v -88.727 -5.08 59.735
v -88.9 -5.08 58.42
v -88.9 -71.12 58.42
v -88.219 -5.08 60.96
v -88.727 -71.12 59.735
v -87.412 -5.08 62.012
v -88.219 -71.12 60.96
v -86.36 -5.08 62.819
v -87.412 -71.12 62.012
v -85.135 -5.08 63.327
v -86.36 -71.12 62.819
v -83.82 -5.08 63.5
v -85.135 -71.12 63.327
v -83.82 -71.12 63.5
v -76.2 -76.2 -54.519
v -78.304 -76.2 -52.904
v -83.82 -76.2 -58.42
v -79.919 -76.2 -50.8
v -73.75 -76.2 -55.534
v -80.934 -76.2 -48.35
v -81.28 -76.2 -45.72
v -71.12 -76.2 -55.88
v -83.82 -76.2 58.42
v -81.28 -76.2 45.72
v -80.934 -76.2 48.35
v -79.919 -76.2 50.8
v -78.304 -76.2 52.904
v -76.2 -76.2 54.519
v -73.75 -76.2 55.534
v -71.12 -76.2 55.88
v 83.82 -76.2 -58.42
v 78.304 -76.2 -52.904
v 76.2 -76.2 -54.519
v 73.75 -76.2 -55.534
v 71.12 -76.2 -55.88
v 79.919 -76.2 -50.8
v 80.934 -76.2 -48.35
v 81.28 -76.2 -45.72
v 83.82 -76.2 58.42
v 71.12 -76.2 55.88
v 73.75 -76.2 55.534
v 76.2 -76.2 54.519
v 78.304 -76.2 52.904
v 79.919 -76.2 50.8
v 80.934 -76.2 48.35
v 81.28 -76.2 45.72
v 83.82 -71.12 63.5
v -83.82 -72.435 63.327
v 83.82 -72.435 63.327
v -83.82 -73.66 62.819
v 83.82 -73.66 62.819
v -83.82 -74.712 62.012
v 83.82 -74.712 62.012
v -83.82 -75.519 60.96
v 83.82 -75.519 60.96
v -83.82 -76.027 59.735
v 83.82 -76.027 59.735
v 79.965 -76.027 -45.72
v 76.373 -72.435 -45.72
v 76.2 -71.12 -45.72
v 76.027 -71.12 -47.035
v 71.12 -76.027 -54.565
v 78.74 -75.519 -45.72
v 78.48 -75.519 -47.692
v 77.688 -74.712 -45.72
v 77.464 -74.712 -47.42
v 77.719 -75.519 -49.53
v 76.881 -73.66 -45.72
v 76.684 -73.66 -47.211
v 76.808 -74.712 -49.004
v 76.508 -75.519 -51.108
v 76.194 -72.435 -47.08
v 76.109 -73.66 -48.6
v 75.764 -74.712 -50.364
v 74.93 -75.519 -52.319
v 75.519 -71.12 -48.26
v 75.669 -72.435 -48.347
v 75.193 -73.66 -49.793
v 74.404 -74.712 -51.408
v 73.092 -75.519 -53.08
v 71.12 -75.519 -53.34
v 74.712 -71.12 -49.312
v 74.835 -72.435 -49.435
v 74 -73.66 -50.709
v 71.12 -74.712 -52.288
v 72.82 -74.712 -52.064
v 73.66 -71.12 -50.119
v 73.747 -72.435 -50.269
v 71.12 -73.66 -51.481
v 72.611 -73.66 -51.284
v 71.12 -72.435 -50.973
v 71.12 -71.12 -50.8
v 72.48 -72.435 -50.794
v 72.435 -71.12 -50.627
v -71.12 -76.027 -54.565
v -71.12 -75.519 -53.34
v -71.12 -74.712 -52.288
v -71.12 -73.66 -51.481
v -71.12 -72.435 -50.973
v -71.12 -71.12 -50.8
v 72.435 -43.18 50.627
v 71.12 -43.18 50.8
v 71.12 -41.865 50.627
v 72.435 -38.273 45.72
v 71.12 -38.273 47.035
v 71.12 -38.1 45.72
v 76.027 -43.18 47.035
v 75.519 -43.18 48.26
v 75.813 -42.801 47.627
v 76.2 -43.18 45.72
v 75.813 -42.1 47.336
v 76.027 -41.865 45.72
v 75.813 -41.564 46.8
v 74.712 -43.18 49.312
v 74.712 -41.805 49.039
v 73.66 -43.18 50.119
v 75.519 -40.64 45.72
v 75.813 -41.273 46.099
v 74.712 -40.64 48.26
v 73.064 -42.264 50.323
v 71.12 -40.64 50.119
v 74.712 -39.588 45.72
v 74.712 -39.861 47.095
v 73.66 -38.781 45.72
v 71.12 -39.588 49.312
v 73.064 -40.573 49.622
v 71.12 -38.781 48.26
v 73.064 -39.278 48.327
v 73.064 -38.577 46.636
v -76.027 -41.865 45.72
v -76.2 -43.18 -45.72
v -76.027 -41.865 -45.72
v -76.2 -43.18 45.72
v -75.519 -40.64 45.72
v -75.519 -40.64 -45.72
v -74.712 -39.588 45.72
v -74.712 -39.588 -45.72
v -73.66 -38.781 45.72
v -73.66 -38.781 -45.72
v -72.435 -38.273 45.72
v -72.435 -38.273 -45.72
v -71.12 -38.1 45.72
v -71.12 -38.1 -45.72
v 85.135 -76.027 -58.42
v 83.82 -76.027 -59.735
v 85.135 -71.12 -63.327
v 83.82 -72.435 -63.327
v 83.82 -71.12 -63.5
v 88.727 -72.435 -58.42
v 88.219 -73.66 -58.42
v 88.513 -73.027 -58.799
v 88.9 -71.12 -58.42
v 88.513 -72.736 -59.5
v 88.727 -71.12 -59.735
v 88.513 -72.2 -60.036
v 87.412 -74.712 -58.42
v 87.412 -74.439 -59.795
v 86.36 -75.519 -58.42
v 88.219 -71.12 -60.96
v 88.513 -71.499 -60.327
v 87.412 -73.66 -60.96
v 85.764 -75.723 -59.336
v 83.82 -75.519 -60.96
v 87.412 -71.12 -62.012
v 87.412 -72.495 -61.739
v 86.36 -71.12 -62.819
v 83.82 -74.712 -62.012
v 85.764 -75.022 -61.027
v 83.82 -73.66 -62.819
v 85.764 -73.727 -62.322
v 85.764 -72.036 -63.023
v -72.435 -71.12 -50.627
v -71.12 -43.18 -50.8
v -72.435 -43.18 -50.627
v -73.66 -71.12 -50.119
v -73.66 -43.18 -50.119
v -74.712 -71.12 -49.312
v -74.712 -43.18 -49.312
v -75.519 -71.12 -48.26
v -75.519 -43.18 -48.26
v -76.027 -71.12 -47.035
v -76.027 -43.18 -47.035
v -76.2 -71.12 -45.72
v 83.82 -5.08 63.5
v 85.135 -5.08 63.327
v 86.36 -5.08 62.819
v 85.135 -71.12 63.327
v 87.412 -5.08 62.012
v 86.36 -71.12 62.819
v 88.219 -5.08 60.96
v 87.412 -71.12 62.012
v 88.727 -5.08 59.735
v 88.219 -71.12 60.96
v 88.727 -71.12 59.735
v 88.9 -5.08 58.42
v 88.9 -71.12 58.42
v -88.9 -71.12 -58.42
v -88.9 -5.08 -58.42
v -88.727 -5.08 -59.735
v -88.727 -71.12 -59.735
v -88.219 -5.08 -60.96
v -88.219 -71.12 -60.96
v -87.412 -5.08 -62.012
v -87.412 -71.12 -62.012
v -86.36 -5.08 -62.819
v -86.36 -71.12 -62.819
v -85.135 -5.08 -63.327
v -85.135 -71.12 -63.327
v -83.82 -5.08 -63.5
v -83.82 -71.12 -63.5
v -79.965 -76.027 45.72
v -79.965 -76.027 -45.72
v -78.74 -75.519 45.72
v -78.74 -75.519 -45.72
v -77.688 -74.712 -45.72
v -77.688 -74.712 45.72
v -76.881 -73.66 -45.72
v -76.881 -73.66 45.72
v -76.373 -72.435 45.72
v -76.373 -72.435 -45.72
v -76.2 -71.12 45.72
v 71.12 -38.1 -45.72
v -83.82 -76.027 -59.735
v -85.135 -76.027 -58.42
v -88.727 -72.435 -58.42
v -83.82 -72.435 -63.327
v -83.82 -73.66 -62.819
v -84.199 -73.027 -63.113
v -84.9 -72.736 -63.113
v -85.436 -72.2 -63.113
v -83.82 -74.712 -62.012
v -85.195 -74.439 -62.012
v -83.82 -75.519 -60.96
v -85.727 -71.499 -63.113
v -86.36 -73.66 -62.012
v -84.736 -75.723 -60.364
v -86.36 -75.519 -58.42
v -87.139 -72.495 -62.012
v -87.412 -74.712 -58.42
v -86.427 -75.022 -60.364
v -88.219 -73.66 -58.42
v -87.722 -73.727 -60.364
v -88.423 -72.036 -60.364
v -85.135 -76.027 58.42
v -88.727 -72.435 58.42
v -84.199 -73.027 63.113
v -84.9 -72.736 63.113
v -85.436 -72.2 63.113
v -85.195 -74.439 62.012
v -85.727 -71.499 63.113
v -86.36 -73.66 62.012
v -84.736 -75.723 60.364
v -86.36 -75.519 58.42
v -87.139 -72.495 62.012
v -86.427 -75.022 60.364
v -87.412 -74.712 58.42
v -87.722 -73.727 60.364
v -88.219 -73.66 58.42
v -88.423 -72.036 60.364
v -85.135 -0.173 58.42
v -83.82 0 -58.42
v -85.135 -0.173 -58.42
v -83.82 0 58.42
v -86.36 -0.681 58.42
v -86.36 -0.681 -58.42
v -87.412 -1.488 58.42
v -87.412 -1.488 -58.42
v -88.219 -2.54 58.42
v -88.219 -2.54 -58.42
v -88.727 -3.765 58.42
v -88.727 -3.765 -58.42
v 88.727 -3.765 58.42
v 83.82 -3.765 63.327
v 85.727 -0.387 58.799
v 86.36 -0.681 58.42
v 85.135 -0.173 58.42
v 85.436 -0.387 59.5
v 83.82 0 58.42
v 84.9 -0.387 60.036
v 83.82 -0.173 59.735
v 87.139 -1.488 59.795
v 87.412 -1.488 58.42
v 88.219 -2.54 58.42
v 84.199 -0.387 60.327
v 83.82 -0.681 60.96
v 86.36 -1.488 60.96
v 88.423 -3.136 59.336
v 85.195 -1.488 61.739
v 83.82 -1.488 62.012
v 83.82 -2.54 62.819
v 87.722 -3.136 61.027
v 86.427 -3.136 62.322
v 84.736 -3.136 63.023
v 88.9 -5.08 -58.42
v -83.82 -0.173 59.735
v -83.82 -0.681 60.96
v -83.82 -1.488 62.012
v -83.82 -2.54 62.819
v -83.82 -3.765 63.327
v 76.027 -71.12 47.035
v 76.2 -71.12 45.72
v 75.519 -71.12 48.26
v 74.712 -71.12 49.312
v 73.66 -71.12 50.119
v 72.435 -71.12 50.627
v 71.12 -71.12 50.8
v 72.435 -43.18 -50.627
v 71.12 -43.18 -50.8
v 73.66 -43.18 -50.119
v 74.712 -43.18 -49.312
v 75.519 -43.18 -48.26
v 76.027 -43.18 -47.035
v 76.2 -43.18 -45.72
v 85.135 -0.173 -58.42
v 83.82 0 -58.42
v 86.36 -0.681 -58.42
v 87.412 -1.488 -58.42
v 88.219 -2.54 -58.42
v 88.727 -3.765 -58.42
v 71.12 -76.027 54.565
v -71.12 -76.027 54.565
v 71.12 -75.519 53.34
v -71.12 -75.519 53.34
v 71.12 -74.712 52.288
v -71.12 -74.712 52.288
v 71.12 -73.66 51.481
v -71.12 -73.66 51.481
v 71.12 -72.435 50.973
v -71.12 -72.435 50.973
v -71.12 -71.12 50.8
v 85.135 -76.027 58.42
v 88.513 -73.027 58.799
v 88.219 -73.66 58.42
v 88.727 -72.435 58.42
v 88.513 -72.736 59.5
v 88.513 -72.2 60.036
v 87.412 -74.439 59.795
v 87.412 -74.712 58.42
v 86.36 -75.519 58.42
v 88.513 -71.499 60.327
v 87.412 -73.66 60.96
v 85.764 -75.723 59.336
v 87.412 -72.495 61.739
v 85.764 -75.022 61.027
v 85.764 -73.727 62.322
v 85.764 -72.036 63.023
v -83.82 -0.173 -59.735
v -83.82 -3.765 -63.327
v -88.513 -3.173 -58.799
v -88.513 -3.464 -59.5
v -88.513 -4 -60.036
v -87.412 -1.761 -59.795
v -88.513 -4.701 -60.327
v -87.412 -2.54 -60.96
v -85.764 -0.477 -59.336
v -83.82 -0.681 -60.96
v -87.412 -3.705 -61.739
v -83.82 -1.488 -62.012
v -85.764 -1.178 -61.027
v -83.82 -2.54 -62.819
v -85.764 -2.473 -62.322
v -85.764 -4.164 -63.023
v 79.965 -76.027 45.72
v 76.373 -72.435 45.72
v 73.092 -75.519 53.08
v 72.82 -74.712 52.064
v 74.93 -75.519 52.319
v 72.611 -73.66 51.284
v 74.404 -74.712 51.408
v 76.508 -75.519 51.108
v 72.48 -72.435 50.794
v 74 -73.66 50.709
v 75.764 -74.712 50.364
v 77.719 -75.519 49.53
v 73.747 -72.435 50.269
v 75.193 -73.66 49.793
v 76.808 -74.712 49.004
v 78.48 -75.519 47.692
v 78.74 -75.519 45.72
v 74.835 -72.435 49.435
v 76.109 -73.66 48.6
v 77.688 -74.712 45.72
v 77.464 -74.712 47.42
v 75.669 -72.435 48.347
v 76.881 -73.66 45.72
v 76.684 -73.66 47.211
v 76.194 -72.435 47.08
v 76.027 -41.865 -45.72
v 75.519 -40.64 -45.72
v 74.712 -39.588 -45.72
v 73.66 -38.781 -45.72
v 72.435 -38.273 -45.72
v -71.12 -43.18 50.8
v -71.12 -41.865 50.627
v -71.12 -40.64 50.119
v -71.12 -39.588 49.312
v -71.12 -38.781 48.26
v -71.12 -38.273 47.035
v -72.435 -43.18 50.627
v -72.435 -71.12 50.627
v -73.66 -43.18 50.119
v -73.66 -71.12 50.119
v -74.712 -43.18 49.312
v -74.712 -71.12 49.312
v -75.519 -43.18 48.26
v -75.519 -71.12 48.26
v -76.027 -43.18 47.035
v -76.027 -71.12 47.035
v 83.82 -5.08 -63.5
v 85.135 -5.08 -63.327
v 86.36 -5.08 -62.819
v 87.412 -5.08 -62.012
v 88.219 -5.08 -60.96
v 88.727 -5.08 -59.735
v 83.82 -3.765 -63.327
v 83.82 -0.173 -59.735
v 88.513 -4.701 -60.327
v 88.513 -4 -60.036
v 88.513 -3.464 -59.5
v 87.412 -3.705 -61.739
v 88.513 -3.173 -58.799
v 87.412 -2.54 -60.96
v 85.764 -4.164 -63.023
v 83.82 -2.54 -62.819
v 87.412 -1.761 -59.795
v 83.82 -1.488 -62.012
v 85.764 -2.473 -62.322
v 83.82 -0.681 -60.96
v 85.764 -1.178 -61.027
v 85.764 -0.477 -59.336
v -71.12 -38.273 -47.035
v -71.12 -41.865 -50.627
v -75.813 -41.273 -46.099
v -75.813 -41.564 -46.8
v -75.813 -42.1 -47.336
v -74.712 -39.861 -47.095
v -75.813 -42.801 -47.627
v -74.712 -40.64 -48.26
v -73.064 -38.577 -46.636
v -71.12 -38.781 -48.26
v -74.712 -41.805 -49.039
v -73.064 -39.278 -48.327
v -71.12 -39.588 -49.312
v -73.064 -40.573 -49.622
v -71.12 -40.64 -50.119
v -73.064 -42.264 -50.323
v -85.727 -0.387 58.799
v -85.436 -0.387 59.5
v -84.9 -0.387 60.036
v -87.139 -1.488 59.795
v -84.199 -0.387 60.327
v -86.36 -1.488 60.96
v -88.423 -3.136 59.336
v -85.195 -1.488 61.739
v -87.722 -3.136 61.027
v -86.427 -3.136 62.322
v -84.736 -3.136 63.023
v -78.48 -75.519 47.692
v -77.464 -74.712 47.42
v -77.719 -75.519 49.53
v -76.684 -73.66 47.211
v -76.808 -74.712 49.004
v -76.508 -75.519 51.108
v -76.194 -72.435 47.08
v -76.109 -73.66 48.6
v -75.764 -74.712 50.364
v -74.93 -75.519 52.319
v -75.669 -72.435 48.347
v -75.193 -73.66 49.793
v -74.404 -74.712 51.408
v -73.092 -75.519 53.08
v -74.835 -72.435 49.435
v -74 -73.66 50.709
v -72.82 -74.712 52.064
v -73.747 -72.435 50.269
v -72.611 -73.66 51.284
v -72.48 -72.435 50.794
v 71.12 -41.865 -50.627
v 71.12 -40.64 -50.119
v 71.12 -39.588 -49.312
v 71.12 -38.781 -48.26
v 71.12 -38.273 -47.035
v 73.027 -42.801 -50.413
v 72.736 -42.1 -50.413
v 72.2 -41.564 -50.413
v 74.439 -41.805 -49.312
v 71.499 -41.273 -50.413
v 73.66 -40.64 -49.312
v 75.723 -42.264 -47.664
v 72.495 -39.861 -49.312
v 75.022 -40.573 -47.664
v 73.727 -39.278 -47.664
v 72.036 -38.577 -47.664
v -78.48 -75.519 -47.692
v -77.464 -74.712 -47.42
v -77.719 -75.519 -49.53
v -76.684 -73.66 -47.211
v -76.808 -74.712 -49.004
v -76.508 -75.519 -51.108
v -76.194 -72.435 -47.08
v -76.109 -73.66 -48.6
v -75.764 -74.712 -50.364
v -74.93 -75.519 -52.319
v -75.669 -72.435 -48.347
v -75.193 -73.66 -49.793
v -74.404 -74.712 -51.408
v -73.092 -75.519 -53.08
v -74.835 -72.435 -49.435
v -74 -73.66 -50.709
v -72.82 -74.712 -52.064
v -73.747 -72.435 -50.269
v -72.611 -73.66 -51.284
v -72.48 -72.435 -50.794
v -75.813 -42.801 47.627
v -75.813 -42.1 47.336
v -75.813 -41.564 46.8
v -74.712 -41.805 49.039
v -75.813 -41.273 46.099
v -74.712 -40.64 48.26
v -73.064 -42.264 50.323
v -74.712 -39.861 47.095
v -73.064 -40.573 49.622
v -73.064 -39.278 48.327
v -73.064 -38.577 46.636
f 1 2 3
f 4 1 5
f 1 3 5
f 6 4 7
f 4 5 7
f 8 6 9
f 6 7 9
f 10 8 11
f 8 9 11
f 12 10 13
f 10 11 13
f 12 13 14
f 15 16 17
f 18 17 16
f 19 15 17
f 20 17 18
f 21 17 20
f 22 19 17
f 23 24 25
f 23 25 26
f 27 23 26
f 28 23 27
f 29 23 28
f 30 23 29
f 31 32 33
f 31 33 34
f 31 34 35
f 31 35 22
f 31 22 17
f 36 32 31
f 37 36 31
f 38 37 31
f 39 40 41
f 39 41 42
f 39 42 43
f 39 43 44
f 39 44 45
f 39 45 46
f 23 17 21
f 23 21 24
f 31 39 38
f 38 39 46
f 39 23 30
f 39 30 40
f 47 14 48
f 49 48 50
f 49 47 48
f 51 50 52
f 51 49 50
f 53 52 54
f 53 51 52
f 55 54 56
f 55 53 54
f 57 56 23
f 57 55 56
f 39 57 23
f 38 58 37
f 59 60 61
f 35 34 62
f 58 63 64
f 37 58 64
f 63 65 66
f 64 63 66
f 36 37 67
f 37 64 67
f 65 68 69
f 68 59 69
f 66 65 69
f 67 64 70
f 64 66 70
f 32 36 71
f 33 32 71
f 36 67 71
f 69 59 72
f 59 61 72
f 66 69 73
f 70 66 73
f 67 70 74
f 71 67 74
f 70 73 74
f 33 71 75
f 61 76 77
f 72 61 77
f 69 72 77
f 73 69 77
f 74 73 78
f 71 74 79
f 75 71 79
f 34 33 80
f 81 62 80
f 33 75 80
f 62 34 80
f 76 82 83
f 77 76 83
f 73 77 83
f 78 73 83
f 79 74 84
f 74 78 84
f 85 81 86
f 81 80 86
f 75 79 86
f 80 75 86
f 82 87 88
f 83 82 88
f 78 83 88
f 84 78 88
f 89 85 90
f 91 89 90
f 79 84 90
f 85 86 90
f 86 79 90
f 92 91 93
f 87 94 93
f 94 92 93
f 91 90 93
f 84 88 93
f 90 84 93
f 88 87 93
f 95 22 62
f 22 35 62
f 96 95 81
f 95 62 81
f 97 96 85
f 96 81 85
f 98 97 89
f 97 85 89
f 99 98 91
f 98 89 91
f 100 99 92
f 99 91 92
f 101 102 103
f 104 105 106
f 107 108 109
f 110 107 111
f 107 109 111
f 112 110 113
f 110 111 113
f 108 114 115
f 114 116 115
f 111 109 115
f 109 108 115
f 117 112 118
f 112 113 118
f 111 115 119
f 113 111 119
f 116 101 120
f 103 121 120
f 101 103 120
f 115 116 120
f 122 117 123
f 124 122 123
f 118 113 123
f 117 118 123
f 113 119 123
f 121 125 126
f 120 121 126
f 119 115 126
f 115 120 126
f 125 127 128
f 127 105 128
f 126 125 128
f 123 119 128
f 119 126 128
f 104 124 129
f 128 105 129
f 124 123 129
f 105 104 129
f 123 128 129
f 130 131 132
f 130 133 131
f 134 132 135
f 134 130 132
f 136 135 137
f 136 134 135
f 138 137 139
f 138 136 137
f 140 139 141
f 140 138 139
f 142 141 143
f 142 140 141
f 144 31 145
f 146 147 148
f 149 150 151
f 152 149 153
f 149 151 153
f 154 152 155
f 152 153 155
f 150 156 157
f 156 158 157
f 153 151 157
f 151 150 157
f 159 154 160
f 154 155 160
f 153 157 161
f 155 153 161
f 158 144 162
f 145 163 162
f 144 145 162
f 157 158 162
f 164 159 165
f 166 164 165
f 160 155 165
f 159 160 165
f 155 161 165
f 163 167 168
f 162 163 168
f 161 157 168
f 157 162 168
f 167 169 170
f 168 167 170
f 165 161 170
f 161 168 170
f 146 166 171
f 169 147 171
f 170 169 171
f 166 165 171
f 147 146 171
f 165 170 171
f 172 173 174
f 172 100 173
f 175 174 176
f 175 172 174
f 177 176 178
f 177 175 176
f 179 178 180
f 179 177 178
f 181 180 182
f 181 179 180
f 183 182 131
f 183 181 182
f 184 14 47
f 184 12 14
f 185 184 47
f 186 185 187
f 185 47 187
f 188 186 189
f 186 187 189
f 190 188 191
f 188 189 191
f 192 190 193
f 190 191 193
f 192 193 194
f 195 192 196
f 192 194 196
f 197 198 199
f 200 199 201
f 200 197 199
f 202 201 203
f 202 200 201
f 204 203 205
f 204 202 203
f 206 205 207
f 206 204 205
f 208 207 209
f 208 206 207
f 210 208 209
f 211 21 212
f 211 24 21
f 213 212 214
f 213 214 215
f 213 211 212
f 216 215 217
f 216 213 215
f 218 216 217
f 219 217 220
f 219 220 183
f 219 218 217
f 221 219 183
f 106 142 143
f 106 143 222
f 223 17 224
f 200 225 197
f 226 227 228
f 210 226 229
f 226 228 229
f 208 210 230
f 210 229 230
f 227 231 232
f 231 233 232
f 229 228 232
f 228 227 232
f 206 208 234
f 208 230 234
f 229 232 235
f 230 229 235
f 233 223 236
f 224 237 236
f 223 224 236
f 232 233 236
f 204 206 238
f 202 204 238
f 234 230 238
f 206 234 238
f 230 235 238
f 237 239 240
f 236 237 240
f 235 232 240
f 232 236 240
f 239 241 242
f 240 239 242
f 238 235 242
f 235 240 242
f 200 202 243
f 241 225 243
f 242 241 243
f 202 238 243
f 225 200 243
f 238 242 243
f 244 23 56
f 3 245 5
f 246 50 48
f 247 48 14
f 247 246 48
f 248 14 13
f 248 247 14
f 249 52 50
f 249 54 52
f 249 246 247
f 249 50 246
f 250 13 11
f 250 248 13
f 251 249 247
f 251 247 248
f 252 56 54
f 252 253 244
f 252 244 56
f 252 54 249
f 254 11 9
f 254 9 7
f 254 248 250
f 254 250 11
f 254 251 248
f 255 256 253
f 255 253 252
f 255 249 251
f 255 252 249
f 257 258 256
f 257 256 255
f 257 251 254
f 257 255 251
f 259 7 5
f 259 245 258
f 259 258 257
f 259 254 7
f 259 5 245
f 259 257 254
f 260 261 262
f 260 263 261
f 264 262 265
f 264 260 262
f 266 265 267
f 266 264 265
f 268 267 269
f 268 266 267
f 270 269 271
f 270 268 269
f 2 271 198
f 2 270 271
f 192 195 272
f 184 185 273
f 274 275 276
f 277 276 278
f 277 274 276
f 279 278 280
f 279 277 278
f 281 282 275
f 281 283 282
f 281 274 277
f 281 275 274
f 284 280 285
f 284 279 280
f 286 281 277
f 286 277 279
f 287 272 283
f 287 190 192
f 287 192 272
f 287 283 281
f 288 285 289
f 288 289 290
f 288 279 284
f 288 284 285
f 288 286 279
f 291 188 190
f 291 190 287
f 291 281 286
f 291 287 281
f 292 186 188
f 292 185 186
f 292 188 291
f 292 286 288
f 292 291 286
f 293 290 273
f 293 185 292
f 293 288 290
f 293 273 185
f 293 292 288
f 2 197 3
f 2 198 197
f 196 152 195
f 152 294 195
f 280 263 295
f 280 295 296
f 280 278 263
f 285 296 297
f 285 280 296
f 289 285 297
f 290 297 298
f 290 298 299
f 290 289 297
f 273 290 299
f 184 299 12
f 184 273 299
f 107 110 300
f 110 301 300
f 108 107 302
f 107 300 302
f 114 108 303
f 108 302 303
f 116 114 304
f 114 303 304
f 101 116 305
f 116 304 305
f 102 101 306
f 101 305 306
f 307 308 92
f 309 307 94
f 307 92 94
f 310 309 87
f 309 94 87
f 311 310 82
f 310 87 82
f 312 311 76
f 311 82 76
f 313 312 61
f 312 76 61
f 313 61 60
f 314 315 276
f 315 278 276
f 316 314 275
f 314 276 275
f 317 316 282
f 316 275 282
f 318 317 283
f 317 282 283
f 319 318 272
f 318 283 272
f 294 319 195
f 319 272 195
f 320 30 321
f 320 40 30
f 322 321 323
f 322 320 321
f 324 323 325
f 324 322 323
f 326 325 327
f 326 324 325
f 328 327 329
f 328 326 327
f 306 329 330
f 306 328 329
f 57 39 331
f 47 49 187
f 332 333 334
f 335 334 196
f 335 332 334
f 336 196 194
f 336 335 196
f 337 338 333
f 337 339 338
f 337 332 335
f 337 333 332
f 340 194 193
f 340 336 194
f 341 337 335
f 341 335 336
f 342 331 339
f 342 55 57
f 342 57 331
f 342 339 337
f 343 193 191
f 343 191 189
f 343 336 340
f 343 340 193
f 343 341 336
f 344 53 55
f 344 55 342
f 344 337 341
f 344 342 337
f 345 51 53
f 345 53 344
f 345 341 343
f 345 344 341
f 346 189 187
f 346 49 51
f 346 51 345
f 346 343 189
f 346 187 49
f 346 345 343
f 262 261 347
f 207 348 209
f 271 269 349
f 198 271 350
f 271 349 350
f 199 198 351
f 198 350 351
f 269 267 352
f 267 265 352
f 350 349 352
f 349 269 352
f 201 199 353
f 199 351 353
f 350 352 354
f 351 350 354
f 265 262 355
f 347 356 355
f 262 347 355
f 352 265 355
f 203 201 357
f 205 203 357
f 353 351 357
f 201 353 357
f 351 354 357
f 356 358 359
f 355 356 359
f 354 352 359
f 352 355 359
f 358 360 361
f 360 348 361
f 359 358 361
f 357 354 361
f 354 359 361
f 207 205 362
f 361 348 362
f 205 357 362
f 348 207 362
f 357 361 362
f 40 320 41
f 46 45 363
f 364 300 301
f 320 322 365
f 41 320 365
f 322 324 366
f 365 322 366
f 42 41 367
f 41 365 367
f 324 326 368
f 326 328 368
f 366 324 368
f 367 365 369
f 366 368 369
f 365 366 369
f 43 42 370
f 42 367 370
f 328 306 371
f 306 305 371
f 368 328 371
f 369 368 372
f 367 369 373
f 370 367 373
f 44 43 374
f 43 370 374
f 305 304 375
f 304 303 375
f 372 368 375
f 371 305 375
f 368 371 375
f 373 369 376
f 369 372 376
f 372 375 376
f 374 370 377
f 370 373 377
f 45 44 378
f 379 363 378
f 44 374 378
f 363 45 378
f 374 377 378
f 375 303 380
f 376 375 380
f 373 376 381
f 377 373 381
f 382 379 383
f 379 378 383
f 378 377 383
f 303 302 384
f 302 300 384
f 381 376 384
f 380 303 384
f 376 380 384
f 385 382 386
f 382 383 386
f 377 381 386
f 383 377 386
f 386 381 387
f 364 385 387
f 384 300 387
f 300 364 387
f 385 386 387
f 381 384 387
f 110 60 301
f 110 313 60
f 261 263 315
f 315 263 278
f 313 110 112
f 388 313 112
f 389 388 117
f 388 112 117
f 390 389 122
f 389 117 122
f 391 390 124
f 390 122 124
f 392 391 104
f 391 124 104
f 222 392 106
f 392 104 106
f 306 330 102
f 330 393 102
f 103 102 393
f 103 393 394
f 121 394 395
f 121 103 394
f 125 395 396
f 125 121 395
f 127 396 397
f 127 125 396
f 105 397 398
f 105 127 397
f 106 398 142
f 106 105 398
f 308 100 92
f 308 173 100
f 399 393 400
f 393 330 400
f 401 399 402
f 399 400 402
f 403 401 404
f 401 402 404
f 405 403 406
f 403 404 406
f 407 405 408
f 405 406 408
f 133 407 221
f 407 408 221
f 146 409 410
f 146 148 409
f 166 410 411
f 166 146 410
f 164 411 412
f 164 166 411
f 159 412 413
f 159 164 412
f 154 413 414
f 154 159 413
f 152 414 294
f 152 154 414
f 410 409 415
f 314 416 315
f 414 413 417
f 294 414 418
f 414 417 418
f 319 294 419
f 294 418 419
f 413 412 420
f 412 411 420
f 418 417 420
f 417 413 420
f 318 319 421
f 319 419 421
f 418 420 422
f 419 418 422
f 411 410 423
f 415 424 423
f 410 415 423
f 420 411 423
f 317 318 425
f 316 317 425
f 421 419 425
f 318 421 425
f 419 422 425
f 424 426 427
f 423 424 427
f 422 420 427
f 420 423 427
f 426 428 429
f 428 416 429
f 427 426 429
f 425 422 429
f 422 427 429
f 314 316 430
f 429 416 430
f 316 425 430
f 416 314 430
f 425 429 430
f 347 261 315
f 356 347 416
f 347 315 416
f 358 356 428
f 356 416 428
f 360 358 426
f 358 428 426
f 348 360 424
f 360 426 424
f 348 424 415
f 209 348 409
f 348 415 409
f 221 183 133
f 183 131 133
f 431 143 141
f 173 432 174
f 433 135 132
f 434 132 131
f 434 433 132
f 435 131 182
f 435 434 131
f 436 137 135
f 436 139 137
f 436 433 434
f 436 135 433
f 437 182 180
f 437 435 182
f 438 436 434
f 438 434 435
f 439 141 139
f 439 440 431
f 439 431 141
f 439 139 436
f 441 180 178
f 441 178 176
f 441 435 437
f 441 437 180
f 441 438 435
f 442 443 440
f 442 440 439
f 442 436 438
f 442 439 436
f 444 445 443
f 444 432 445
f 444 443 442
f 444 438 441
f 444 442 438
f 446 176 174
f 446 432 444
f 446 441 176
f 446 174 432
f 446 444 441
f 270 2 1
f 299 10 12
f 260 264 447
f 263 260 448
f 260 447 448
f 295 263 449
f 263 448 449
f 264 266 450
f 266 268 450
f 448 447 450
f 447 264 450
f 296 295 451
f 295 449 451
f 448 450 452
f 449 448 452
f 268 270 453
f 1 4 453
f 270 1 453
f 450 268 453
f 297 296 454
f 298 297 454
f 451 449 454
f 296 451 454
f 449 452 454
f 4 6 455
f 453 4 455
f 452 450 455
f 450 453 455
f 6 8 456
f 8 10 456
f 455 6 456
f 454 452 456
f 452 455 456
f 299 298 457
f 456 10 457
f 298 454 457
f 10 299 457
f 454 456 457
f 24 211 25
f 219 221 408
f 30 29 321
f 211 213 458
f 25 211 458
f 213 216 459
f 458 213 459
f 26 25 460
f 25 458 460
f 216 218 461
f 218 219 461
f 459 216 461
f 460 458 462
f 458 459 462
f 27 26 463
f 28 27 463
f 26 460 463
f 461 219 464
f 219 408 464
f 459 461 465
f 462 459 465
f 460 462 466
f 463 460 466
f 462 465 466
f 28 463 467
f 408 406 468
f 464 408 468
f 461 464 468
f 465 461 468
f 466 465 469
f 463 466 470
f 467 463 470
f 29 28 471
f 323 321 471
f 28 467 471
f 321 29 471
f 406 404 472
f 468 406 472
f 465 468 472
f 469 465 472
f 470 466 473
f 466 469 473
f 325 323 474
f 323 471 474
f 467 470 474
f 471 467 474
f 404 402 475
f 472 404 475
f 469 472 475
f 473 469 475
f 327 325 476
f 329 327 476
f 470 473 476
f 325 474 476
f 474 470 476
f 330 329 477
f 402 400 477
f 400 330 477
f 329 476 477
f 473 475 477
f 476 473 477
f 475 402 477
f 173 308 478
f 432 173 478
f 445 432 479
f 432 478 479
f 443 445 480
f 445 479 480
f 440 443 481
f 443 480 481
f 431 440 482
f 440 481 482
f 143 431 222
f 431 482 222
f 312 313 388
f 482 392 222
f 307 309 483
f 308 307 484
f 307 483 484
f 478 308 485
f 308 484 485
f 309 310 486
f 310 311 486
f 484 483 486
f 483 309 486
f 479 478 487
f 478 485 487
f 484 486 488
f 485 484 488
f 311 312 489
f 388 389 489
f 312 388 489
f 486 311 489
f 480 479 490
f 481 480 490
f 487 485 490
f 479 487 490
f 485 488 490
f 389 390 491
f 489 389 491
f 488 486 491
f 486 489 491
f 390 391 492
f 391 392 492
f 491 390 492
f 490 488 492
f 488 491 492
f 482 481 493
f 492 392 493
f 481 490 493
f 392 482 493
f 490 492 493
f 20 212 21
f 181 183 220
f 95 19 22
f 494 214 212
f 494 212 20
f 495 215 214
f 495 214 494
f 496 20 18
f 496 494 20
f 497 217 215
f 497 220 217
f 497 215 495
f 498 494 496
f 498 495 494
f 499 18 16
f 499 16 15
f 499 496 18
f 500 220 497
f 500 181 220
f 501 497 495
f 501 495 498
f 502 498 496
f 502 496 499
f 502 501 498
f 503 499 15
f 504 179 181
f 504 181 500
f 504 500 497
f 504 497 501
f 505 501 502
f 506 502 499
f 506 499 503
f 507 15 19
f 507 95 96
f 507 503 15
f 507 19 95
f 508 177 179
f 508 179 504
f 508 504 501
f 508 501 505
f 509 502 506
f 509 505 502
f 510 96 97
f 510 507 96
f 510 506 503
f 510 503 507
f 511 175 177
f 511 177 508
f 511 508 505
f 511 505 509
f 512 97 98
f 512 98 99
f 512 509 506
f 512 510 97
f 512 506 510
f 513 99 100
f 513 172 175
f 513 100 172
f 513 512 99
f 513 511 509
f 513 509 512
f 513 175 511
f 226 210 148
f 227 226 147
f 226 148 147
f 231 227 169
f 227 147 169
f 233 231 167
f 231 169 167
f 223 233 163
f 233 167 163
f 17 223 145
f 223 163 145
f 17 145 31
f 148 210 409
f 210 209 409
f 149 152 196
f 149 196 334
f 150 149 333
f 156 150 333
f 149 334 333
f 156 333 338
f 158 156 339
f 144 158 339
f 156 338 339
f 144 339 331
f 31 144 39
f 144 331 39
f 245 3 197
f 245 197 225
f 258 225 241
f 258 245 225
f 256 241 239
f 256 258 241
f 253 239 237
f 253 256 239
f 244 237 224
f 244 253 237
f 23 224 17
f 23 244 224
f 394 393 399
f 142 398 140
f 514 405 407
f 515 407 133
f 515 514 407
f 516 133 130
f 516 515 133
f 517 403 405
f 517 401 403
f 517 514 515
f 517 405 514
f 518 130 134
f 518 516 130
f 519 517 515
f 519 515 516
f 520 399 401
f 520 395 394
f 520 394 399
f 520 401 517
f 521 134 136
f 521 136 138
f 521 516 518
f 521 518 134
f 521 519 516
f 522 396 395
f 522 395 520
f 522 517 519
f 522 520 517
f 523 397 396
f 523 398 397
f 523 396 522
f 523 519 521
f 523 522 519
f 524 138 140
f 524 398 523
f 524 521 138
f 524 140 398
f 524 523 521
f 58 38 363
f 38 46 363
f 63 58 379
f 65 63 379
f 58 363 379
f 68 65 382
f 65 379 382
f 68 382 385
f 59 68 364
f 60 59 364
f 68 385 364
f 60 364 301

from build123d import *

# Parameters (mm, degrees)
F0_W     = 177.8
F0_H     = 127
F0_W_2   = 152.4
F0_H_2   = 101.6
F1_DEPTH = 76.2
F2_DEPTH = 38.1
F3_R     = 5.08


with BuildPart() as f1:
    # F0 (on Front) → F1 (new body)
    with BuildSketch(Plane.XZ):
        Rectangle(F0_W, F0_H)
        Rectangle(F0_W_2, F0_H_2, mode=Mode.SUBTRACT)
    extrude(amount=F1_DEPTH)

    # F0 (on Front) → F2 (join)
    with BuildSketch(Plane.XZ):
        Rectangle(F0_W_2, F0_H_2)
    extrude(amount=F2_DEPTH)

    # F3
    f3_edges = [f1.edges().sort_by_distance(p)[0] for p in [
        (-88.9, -76.2, 0),
        (0, -76.2, 63.5),
        (0, -76.2, -63.5),
        (88.9, -76.2, 0),
        (-76.2, -76.2, 0),
        (0, -76.2, 50.8),
        (76.2, -76.2, 0),
        (0, -76.2, -50.8),
        (0, -38.1, 50.8),
        (76.2, -57.15, 50.8),
        (76.2, -38.1, 0),
        (76.2, -57.15, -50.8),
        (0, -38.1, -50.8),
        (-76.2, -57.15, 50.8),
        (-76.2, -38.1, 0),
        (-76.2, -57.15, -50.8),
        (-88.9, -38.1, 63.5),
        (0, 0, -63.5),
        (-88.9, 0, 0),
        (-88.9, -38.1, -63.5),
        (88.9, -38.1, -63.5),
        (88.9, -38.1, 63.5),
        (88.9, 0, 0),
        (0, 0, 63.5),
    ]]
    fillet(f3_edges, radius=F3_R)


solid = f1.part
